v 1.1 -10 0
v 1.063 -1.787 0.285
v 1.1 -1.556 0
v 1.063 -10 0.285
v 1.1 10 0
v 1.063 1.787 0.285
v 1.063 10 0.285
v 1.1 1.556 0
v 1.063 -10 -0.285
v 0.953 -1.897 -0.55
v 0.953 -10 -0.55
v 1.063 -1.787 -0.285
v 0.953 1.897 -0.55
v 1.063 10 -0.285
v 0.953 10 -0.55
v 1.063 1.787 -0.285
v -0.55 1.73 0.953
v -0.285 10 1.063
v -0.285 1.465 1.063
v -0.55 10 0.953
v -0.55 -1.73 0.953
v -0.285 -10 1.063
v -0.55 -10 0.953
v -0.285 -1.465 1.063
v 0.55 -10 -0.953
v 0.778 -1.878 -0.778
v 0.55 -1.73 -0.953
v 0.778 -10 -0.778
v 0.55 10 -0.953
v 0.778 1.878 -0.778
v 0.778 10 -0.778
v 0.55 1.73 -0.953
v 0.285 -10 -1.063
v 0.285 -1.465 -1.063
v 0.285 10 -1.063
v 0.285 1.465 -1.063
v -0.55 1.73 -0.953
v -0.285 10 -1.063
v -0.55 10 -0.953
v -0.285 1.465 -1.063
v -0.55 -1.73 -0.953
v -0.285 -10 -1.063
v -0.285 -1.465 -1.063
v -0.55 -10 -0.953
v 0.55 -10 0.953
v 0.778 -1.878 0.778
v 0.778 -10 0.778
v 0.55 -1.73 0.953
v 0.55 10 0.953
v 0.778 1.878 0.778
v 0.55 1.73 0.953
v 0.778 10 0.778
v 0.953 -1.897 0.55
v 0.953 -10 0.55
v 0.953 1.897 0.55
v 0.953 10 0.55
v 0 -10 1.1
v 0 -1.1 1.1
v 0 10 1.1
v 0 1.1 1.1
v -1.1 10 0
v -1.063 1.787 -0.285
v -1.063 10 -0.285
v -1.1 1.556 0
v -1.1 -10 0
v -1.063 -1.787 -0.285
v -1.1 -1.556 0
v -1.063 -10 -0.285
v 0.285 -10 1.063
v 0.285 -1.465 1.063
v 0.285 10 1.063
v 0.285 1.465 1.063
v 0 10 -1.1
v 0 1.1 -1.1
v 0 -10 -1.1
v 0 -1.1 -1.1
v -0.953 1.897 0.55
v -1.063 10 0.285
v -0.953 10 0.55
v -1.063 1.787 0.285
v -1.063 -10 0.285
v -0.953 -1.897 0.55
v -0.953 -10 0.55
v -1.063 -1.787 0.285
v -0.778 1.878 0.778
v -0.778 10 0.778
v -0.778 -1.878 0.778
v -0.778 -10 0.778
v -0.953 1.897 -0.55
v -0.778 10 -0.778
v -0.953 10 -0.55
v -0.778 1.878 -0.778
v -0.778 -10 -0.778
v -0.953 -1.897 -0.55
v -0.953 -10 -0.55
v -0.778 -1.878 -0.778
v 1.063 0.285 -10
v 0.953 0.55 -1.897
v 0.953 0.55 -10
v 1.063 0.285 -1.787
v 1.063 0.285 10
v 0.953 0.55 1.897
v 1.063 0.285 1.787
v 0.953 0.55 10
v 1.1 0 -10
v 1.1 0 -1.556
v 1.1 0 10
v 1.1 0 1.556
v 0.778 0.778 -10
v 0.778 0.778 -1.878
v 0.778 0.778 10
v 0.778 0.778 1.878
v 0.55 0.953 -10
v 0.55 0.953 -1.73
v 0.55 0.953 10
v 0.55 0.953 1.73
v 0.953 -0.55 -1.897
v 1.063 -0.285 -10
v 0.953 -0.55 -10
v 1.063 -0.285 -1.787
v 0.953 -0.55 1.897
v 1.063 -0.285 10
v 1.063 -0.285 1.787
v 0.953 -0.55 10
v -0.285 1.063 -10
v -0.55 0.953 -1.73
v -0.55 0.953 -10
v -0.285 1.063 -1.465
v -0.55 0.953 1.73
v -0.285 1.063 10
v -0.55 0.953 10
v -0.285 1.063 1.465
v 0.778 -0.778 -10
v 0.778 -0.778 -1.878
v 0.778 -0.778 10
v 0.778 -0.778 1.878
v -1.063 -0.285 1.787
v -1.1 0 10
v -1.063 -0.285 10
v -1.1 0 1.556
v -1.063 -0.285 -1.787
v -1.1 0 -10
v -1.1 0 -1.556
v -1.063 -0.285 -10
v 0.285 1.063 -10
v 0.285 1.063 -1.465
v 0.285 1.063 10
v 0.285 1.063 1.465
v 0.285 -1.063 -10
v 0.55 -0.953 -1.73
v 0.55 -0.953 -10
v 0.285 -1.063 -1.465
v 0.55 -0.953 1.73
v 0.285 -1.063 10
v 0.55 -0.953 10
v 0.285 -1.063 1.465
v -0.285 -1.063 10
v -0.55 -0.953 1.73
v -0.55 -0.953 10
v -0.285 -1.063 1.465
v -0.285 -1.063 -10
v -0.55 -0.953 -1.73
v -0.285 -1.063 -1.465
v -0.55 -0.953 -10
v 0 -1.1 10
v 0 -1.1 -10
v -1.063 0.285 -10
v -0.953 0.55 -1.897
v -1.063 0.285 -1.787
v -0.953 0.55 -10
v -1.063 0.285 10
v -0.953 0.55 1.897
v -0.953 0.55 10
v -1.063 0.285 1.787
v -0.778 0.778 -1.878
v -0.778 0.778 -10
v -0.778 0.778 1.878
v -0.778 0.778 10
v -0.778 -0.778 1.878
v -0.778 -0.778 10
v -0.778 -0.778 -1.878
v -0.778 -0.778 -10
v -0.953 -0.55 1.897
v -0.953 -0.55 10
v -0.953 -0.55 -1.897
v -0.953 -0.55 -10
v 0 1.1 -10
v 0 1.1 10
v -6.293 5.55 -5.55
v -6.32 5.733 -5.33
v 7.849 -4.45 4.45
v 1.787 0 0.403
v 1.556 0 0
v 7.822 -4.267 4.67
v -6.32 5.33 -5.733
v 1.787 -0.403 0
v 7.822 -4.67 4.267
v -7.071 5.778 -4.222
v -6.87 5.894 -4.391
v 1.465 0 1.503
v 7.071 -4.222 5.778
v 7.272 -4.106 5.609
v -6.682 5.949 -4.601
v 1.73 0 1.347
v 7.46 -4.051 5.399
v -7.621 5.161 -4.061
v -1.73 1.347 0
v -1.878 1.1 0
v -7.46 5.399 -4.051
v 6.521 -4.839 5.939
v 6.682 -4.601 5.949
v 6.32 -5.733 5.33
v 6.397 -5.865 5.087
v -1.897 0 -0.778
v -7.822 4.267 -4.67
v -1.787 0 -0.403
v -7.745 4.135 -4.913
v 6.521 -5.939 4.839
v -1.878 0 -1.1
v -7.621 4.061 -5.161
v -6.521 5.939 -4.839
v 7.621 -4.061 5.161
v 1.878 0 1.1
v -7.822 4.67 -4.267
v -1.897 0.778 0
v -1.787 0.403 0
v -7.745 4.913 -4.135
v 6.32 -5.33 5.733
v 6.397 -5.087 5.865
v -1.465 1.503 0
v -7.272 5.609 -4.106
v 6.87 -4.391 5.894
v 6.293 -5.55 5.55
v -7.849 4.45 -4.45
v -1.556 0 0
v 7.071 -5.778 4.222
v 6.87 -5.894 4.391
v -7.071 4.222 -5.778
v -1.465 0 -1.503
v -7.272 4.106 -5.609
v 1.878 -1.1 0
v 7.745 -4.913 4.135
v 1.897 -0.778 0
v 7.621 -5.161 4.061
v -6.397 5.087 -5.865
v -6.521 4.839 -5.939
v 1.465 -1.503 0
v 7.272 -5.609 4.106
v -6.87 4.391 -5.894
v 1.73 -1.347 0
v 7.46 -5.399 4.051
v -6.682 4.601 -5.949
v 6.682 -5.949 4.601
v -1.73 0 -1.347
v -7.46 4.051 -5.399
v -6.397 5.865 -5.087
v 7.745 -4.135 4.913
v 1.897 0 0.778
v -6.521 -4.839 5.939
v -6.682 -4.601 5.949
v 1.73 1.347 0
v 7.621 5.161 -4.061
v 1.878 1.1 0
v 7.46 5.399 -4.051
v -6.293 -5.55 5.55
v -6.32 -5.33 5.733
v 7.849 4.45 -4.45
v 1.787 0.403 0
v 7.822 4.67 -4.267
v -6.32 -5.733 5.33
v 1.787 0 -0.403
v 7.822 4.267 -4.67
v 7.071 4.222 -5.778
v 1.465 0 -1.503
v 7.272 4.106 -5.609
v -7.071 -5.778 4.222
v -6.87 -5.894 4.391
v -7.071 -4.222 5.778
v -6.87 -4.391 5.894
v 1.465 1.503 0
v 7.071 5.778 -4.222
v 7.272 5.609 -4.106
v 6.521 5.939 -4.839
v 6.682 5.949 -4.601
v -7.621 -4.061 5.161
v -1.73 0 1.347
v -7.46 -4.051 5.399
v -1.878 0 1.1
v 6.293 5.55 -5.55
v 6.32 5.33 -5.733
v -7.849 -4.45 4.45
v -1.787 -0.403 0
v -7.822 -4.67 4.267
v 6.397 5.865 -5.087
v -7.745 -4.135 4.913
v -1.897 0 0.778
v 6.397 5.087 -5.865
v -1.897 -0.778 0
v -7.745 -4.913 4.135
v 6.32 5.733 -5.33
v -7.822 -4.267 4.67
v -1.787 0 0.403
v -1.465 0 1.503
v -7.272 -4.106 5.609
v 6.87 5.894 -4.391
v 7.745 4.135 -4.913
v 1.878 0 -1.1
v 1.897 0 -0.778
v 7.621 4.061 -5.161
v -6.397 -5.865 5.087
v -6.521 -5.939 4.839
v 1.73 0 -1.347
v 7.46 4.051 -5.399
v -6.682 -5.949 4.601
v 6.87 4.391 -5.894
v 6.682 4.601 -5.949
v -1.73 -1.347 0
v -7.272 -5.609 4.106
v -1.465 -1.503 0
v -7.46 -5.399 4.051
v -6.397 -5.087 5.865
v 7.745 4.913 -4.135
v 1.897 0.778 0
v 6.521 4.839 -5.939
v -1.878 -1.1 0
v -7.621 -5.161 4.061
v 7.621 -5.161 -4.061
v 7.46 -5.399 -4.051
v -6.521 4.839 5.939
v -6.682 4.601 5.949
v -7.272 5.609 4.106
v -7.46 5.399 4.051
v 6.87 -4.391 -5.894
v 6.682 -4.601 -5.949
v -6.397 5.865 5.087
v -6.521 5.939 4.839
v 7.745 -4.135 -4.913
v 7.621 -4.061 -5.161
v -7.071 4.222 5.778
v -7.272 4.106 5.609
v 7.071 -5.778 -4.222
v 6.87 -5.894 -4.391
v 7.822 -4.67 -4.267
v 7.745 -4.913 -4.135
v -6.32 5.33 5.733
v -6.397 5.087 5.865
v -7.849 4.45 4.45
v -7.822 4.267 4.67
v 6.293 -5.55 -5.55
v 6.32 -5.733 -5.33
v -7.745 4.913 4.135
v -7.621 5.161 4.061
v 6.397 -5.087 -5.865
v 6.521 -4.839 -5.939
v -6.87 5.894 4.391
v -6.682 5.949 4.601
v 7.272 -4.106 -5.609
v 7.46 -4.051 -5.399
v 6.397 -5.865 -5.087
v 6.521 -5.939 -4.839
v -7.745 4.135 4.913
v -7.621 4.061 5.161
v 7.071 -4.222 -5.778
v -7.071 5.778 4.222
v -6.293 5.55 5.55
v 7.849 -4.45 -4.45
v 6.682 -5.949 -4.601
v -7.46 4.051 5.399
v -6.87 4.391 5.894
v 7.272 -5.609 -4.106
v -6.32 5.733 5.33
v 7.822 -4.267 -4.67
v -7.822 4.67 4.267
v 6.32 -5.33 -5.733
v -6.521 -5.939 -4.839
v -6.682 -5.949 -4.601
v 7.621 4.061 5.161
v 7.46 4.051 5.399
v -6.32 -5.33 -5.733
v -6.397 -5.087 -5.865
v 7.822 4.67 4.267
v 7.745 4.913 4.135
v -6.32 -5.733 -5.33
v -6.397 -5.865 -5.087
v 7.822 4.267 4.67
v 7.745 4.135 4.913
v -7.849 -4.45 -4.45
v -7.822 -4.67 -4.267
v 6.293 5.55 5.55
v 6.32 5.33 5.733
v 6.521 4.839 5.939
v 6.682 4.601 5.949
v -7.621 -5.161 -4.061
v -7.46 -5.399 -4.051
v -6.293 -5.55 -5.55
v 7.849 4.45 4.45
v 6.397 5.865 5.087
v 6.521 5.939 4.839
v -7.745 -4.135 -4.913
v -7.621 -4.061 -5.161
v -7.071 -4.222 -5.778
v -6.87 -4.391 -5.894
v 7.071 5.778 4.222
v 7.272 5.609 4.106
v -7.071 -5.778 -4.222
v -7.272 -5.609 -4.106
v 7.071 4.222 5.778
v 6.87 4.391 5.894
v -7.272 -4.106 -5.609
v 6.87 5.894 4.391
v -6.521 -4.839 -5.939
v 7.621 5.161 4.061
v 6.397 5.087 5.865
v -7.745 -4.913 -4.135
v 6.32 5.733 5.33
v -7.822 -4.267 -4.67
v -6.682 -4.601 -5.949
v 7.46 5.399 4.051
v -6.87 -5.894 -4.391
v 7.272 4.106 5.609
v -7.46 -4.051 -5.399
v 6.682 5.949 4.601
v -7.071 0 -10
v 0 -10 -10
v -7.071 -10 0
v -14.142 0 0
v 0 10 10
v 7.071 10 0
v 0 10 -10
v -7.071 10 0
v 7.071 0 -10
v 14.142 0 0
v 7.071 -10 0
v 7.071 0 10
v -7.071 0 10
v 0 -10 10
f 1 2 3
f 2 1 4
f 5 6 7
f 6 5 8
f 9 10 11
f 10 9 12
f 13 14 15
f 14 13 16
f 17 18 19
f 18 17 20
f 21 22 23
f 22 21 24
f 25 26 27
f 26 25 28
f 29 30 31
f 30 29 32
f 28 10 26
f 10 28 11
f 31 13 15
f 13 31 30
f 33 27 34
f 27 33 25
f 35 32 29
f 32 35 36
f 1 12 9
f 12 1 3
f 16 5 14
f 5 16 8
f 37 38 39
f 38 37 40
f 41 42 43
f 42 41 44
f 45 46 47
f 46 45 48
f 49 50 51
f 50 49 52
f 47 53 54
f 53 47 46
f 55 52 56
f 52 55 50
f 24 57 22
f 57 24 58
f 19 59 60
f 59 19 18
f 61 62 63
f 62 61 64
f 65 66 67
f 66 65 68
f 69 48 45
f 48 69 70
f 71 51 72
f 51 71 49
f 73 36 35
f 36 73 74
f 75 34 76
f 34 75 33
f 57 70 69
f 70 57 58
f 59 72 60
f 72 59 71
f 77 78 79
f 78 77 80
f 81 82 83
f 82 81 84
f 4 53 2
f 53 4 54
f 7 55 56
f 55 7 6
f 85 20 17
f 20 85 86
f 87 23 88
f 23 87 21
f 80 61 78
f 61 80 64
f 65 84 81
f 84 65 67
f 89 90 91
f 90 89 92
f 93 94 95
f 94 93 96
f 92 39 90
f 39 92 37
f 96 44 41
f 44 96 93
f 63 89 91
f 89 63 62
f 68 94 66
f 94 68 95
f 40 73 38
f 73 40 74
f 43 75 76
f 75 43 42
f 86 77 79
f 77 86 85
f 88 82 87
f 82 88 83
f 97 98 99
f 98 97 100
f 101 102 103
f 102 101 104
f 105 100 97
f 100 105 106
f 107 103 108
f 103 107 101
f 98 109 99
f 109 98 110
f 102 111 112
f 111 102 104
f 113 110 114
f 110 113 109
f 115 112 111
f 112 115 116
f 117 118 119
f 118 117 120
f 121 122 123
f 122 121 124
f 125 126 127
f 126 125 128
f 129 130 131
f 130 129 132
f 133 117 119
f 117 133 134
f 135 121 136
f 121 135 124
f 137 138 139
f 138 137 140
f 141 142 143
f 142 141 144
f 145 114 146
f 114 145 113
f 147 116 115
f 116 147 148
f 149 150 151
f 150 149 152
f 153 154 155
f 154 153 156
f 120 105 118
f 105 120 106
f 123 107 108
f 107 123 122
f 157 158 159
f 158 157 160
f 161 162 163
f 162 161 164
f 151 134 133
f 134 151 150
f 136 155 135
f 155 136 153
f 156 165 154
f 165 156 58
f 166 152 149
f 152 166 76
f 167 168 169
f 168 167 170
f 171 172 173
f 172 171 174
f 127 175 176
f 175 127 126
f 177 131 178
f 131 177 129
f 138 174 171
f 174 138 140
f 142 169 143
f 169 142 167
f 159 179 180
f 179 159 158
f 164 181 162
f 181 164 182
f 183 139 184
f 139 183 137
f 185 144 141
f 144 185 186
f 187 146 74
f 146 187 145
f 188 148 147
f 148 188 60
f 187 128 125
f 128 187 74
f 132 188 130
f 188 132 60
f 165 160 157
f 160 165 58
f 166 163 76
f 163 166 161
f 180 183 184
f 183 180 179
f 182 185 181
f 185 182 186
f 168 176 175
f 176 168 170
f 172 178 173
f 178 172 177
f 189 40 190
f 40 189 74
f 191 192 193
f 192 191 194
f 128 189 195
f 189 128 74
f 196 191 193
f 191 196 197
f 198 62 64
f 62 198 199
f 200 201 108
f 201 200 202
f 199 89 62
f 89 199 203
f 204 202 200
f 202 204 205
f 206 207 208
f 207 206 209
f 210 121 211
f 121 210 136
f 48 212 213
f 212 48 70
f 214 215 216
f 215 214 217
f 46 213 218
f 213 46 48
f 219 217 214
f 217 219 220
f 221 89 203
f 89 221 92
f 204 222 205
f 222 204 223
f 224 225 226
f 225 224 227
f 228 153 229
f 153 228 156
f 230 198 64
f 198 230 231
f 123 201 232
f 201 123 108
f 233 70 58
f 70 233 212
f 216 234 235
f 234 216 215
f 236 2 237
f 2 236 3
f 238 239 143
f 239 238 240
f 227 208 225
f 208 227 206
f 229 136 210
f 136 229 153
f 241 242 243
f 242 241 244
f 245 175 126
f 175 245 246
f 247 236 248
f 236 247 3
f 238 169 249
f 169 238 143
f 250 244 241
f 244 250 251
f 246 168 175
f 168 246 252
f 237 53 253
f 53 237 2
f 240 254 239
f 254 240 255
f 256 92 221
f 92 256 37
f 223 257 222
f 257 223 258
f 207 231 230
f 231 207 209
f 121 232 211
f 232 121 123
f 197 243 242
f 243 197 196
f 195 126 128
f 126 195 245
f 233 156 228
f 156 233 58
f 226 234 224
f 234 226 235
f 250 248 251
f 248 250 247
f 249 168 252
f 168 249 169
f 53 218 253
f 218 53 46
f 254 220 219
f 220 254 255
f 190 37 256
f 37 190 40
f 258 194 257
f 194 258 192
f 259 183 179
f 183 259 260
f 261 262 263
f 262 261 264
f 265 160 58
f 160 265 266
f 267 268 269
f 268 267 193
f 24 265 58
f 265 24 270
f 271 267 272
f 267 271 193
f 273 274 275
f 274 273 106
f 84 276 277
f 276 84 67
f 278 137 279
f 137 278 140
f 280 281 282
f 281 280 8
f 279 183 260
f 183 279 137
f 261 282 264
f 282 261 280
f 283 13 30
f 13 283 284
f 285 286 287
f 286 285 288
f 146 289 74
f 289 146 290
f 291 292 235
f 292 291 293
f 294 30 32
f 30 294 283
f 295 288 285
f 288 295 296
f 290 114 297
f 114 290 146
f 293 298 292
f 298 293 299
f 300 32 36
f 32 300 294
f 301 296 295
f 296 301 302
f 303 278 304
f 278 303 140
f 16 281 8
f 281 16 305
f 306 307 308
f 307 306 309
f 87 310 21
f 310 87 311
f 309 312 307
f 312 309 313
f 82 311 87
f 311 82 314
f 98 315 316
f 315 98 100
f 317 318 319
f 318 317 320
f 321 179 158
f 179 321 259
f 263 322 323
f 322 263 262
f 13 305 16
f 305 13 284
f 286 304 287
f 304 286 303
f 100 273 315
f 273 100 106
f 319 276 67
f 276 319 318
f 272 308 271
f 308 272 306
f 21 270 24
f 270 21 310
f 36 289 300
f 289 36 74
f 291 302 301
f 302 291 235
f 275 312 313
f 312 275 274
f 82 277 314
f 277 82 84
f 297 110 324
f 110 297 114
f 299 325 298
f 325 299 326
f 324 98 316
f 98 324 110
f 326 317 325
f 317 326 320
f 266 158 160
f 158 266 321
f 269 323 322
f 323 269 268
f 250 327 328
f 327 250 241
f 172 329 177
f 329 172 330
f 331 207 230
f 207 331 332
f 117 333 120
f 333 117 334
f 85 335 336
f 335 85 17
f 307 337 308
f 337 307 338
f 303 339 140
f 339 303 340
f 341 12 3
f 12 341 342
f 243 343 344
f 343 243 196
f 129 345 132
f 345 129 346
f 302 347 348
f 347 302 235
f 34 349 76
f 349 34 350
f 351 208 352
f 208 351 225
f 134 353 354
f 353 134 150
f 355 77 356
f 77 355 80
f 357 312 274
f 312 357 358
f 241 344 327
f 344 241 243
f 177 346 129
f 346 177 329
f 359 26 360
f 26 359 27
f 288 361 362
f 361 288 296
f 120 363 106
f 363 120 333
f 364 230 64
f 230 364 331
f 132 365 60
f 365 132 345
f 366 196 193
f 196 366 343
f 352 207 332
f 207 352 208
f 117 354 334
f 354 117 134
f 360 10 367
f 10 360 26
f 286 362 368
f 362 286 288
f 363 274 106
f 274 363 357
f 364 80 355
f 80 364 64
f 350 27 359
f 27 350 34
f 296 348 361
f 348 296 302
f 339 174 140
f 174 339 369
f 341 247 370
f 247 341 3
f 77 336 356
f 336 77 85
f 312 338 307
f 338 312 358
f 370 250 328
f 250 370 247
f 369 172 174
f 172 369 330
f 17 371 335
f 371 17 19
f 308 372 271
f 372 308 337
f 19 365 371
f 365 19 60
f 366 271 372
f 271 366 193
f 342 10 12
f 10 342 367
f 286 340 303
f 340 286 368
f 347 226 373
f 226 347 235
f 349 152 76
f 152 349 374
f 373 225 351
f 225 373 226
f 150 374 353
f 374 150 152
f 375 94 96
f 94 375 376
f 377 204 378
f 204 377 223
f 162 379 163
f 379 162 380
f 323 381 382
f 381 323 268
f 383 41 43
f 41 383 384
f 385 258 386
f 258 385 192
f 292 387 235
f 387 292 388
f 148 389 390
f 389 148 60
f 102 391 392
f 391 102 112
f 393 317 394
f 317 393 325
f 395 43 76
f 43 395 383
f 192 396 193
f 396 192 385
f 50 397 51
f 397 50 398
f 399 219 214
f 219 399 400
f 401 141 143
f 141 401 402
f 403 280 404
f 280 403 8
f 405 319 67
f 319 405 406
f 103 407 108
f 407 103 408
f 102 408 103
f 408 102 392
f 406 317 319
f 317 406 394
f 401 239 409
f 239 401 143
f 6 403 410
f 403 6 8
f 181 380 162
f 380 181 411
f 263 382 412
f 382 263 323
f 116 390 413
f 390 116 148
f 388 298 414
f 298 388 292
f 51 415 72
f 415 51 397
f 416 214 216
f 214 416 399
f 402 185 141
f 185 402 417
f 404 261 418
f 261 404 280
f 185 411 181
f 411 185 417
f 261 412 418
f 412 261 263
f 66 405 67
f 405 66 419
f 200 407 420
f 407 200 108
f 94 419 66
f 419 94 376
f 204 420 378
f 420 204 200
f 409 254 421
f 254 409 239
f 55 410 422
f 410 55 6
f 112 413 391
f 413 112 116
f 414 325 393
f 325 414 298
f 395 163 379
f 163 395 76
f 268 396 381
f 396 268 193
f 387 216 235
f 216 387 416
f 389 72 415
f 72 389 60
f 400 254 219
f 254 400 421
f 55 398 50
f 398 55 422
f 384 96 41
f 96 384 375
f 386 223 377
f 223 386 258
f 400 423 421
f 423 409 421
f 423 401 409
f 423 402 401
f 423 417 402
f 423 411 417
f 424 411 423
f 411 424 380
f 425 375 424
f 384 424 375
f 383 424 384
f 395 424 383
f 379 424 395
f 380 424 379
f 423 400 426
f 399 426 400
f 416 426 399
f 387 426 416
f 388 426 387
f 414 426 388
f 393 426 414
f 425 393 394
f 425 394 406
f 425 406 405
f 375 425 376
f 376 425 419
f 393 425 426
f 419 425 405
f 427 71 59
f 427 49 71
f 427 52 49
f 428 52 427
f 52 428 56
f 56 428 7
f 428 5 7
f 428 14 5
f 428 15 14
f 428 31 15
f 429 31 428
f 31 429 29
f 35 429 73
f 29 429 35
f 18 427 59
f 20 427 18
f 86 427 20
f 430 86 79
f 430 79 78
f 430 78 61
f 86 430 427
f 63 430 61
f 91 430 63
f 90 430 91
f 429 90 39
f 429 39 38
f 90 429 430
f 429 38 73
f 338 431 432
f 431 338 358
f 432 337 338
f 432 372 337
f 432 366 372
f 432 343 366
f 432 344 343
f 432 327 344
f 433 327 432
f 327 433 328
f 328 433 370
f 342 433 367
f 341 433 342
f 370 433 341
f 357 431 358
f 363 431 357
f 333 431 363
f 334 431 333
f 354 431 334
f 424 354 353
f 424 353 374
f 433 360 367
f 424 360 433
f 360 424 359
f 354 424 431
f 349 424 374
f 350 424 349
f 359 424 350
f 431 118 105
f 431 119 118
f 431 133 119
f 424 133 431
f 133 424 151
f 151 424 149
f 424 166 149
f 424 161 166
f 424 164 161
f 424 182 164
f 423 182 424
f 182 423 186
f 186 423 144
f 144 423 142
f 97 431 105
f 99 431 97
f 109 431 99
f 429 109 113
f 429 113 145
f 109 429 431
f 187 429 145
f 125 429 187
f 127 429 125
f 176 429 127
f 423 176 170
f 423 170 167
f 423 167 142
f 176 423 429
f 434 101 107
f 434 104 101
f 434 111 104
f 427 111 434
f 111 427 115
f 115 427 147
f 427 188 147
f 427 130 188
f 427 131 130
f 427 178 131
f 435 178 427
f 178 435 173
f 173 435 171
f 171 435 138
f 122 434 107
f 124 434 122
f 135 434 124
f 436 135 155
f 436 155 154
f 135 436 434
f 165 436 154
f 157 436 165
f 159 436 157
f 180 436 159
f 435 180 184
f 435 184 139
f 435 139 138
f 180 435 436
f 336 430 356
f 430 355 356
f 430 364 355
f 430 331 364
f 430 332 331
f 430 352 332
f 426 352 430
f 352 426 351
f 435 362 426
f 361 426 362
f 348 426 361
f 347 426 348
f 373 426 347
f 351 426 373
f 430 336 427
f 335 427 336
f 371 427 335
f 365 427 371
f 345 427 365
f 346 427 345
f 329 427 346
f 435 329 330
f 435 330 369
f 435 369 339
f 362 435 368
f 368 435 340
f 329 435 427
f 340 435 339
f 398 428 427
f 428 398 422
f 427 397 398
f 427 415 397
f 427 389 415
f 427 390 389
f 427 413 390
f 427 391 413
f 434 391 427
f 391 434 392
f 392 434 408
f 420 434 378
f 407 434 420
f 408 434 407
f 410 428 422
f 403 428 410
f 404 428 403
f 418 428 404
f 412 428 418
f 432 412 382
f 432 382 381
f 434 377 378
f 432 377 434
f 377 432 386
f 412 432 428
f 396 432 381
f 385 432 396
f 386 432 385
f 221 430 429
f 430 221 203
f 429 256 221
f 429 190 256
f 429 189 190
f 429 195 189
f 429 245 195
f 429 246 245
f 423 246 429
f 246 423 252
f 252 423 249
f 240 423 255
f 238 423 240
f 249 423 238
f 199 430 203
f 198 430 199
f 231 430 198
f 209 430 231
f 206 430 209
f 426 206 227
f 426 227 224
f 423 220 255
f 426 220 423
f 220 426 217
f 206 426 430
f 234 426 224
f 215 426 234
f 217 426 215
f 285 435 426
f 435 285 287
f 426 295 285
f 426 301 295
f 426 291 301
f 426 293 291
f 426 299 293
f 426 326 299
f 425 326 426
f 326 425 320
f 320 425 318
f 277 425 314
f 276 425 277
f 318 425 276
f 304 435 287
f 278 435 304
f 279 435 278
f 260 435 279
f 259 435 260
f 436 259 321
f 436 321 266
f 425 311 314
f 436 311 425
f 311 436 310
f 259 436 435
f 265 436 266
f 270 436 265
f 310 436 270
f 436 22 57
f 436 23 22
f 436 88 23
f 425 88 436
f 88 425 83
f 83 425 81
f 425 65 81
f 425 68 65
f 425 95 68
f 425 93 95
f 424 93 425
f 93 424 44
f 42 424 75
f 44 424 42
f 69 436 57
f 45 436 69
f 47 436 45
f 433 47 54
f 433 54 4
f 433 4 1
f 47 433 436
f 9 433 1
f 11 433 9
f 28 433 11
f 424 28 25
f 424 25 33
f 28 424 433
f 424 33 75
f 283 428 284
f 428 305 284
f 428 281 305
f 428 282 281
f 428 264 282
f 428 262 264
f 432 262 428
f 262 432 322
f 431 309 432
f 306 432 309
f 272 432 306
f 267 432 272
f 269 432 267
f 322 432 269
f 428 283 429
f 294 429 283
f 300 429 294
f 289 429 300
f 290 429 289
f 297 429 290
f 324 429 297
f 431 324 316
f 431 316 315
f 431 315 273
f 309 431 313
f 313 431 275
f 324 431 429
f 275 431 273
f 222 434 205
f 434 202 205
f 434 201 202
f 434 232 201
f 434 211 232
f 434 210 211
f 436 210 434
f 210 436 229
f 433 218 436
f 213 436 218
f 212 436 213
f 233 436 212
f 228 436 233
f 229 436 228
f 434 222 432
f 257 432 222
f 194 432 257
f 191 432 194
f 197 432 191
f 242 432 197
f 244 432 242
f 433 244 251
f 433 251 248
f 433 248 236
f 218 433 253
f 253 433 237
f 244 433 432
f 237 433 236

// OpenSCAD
/*
Ромбический додекаэдр + сквозные отверстия для креплений.
С настраиваемыми параметрами в программе OpenSCAD.

Программист: Полозков Сергей.
Смена в Сириусе "самозаклинивающиеся структуры" в 2023 году.
*/

//Шаг сетки для решётки из ромбододекаэдров (межцентровое расстояние)
MM_GRID_STEP = 20.0;

//диаметр отвертия (диаметр описанной окружности около многоугольника детализации)
//если диаметр = 0, то отверстий нет, 2.2 = диаметр зубочистки
MM_HOLE_DIAMETER = 2.2;

//такой n-угольник для детализации отверстия
HOLE_DETALISATION_IS_N_POLYGON = 24;


CUBE_SIDE = MM_GRID_STEP / sqrt(2);

module m_square_pyramid(square_side = CUBE_SIDE, dz = 0, pyramid_height = CUBE_SIDE * 0.5) {
    translate([0,0,dz])
        rotate(45)
            cylinder(h = pyramid_height, r1 = square_side * 0.5 * sqrt(2), r2 = 0, $fn = 4);
}

module m_two_pyramids(square_side = CUBE_SIDE) {
    hull() {
        m_square_pyramid(square_side, square_side * 0.5, square_side * 0.5);
        mirror(v = [0,0,1])
            m_square_pyramid(square_side, square_side * 0.5, square_side * 0.5);
    }
}

module m_cylinder(rotate_axe=[0,0,1], rotate_deg=45, d=MM_HOLE_DIAMETER, half_h=(MM_GRID_STEP * 0.5) * 1.1) {
    rotate (a=rotate_deg, v=rotate_axe)
        cylinder(h=half_h*2, d=d, center=true, $fn=HOLE_DETALISATION_IS_N_POLYGON);
}

module m_all_cylinders() {
    if (MM_HOLE_DIAMETER > 0) {
        m_cylinder([+1,0,0], +45); m_cylinder([+1,0,0], -45); 
        m_cylinder([0,+1,0], +45); m_cylinder([0,+1,0], -45);
        m_cylinder([+1,+1,0], 90); m_cylinder([+1,-1,0], 90);
    }
}

module m_ball_12_with_no_holes() {
    hull() {
        rotate ([90,0,0]) m_two_pyramids();
        rotate ([0,90,0]) m_two_pyramids();
        rotate ([0,0,90]) m_two_pyramids();
    }
}

rotate(a = 45, v=[1,0,0])
    difference () {
        m_ball_12_with_no_holes();
        m_all_cylinders();
    }
